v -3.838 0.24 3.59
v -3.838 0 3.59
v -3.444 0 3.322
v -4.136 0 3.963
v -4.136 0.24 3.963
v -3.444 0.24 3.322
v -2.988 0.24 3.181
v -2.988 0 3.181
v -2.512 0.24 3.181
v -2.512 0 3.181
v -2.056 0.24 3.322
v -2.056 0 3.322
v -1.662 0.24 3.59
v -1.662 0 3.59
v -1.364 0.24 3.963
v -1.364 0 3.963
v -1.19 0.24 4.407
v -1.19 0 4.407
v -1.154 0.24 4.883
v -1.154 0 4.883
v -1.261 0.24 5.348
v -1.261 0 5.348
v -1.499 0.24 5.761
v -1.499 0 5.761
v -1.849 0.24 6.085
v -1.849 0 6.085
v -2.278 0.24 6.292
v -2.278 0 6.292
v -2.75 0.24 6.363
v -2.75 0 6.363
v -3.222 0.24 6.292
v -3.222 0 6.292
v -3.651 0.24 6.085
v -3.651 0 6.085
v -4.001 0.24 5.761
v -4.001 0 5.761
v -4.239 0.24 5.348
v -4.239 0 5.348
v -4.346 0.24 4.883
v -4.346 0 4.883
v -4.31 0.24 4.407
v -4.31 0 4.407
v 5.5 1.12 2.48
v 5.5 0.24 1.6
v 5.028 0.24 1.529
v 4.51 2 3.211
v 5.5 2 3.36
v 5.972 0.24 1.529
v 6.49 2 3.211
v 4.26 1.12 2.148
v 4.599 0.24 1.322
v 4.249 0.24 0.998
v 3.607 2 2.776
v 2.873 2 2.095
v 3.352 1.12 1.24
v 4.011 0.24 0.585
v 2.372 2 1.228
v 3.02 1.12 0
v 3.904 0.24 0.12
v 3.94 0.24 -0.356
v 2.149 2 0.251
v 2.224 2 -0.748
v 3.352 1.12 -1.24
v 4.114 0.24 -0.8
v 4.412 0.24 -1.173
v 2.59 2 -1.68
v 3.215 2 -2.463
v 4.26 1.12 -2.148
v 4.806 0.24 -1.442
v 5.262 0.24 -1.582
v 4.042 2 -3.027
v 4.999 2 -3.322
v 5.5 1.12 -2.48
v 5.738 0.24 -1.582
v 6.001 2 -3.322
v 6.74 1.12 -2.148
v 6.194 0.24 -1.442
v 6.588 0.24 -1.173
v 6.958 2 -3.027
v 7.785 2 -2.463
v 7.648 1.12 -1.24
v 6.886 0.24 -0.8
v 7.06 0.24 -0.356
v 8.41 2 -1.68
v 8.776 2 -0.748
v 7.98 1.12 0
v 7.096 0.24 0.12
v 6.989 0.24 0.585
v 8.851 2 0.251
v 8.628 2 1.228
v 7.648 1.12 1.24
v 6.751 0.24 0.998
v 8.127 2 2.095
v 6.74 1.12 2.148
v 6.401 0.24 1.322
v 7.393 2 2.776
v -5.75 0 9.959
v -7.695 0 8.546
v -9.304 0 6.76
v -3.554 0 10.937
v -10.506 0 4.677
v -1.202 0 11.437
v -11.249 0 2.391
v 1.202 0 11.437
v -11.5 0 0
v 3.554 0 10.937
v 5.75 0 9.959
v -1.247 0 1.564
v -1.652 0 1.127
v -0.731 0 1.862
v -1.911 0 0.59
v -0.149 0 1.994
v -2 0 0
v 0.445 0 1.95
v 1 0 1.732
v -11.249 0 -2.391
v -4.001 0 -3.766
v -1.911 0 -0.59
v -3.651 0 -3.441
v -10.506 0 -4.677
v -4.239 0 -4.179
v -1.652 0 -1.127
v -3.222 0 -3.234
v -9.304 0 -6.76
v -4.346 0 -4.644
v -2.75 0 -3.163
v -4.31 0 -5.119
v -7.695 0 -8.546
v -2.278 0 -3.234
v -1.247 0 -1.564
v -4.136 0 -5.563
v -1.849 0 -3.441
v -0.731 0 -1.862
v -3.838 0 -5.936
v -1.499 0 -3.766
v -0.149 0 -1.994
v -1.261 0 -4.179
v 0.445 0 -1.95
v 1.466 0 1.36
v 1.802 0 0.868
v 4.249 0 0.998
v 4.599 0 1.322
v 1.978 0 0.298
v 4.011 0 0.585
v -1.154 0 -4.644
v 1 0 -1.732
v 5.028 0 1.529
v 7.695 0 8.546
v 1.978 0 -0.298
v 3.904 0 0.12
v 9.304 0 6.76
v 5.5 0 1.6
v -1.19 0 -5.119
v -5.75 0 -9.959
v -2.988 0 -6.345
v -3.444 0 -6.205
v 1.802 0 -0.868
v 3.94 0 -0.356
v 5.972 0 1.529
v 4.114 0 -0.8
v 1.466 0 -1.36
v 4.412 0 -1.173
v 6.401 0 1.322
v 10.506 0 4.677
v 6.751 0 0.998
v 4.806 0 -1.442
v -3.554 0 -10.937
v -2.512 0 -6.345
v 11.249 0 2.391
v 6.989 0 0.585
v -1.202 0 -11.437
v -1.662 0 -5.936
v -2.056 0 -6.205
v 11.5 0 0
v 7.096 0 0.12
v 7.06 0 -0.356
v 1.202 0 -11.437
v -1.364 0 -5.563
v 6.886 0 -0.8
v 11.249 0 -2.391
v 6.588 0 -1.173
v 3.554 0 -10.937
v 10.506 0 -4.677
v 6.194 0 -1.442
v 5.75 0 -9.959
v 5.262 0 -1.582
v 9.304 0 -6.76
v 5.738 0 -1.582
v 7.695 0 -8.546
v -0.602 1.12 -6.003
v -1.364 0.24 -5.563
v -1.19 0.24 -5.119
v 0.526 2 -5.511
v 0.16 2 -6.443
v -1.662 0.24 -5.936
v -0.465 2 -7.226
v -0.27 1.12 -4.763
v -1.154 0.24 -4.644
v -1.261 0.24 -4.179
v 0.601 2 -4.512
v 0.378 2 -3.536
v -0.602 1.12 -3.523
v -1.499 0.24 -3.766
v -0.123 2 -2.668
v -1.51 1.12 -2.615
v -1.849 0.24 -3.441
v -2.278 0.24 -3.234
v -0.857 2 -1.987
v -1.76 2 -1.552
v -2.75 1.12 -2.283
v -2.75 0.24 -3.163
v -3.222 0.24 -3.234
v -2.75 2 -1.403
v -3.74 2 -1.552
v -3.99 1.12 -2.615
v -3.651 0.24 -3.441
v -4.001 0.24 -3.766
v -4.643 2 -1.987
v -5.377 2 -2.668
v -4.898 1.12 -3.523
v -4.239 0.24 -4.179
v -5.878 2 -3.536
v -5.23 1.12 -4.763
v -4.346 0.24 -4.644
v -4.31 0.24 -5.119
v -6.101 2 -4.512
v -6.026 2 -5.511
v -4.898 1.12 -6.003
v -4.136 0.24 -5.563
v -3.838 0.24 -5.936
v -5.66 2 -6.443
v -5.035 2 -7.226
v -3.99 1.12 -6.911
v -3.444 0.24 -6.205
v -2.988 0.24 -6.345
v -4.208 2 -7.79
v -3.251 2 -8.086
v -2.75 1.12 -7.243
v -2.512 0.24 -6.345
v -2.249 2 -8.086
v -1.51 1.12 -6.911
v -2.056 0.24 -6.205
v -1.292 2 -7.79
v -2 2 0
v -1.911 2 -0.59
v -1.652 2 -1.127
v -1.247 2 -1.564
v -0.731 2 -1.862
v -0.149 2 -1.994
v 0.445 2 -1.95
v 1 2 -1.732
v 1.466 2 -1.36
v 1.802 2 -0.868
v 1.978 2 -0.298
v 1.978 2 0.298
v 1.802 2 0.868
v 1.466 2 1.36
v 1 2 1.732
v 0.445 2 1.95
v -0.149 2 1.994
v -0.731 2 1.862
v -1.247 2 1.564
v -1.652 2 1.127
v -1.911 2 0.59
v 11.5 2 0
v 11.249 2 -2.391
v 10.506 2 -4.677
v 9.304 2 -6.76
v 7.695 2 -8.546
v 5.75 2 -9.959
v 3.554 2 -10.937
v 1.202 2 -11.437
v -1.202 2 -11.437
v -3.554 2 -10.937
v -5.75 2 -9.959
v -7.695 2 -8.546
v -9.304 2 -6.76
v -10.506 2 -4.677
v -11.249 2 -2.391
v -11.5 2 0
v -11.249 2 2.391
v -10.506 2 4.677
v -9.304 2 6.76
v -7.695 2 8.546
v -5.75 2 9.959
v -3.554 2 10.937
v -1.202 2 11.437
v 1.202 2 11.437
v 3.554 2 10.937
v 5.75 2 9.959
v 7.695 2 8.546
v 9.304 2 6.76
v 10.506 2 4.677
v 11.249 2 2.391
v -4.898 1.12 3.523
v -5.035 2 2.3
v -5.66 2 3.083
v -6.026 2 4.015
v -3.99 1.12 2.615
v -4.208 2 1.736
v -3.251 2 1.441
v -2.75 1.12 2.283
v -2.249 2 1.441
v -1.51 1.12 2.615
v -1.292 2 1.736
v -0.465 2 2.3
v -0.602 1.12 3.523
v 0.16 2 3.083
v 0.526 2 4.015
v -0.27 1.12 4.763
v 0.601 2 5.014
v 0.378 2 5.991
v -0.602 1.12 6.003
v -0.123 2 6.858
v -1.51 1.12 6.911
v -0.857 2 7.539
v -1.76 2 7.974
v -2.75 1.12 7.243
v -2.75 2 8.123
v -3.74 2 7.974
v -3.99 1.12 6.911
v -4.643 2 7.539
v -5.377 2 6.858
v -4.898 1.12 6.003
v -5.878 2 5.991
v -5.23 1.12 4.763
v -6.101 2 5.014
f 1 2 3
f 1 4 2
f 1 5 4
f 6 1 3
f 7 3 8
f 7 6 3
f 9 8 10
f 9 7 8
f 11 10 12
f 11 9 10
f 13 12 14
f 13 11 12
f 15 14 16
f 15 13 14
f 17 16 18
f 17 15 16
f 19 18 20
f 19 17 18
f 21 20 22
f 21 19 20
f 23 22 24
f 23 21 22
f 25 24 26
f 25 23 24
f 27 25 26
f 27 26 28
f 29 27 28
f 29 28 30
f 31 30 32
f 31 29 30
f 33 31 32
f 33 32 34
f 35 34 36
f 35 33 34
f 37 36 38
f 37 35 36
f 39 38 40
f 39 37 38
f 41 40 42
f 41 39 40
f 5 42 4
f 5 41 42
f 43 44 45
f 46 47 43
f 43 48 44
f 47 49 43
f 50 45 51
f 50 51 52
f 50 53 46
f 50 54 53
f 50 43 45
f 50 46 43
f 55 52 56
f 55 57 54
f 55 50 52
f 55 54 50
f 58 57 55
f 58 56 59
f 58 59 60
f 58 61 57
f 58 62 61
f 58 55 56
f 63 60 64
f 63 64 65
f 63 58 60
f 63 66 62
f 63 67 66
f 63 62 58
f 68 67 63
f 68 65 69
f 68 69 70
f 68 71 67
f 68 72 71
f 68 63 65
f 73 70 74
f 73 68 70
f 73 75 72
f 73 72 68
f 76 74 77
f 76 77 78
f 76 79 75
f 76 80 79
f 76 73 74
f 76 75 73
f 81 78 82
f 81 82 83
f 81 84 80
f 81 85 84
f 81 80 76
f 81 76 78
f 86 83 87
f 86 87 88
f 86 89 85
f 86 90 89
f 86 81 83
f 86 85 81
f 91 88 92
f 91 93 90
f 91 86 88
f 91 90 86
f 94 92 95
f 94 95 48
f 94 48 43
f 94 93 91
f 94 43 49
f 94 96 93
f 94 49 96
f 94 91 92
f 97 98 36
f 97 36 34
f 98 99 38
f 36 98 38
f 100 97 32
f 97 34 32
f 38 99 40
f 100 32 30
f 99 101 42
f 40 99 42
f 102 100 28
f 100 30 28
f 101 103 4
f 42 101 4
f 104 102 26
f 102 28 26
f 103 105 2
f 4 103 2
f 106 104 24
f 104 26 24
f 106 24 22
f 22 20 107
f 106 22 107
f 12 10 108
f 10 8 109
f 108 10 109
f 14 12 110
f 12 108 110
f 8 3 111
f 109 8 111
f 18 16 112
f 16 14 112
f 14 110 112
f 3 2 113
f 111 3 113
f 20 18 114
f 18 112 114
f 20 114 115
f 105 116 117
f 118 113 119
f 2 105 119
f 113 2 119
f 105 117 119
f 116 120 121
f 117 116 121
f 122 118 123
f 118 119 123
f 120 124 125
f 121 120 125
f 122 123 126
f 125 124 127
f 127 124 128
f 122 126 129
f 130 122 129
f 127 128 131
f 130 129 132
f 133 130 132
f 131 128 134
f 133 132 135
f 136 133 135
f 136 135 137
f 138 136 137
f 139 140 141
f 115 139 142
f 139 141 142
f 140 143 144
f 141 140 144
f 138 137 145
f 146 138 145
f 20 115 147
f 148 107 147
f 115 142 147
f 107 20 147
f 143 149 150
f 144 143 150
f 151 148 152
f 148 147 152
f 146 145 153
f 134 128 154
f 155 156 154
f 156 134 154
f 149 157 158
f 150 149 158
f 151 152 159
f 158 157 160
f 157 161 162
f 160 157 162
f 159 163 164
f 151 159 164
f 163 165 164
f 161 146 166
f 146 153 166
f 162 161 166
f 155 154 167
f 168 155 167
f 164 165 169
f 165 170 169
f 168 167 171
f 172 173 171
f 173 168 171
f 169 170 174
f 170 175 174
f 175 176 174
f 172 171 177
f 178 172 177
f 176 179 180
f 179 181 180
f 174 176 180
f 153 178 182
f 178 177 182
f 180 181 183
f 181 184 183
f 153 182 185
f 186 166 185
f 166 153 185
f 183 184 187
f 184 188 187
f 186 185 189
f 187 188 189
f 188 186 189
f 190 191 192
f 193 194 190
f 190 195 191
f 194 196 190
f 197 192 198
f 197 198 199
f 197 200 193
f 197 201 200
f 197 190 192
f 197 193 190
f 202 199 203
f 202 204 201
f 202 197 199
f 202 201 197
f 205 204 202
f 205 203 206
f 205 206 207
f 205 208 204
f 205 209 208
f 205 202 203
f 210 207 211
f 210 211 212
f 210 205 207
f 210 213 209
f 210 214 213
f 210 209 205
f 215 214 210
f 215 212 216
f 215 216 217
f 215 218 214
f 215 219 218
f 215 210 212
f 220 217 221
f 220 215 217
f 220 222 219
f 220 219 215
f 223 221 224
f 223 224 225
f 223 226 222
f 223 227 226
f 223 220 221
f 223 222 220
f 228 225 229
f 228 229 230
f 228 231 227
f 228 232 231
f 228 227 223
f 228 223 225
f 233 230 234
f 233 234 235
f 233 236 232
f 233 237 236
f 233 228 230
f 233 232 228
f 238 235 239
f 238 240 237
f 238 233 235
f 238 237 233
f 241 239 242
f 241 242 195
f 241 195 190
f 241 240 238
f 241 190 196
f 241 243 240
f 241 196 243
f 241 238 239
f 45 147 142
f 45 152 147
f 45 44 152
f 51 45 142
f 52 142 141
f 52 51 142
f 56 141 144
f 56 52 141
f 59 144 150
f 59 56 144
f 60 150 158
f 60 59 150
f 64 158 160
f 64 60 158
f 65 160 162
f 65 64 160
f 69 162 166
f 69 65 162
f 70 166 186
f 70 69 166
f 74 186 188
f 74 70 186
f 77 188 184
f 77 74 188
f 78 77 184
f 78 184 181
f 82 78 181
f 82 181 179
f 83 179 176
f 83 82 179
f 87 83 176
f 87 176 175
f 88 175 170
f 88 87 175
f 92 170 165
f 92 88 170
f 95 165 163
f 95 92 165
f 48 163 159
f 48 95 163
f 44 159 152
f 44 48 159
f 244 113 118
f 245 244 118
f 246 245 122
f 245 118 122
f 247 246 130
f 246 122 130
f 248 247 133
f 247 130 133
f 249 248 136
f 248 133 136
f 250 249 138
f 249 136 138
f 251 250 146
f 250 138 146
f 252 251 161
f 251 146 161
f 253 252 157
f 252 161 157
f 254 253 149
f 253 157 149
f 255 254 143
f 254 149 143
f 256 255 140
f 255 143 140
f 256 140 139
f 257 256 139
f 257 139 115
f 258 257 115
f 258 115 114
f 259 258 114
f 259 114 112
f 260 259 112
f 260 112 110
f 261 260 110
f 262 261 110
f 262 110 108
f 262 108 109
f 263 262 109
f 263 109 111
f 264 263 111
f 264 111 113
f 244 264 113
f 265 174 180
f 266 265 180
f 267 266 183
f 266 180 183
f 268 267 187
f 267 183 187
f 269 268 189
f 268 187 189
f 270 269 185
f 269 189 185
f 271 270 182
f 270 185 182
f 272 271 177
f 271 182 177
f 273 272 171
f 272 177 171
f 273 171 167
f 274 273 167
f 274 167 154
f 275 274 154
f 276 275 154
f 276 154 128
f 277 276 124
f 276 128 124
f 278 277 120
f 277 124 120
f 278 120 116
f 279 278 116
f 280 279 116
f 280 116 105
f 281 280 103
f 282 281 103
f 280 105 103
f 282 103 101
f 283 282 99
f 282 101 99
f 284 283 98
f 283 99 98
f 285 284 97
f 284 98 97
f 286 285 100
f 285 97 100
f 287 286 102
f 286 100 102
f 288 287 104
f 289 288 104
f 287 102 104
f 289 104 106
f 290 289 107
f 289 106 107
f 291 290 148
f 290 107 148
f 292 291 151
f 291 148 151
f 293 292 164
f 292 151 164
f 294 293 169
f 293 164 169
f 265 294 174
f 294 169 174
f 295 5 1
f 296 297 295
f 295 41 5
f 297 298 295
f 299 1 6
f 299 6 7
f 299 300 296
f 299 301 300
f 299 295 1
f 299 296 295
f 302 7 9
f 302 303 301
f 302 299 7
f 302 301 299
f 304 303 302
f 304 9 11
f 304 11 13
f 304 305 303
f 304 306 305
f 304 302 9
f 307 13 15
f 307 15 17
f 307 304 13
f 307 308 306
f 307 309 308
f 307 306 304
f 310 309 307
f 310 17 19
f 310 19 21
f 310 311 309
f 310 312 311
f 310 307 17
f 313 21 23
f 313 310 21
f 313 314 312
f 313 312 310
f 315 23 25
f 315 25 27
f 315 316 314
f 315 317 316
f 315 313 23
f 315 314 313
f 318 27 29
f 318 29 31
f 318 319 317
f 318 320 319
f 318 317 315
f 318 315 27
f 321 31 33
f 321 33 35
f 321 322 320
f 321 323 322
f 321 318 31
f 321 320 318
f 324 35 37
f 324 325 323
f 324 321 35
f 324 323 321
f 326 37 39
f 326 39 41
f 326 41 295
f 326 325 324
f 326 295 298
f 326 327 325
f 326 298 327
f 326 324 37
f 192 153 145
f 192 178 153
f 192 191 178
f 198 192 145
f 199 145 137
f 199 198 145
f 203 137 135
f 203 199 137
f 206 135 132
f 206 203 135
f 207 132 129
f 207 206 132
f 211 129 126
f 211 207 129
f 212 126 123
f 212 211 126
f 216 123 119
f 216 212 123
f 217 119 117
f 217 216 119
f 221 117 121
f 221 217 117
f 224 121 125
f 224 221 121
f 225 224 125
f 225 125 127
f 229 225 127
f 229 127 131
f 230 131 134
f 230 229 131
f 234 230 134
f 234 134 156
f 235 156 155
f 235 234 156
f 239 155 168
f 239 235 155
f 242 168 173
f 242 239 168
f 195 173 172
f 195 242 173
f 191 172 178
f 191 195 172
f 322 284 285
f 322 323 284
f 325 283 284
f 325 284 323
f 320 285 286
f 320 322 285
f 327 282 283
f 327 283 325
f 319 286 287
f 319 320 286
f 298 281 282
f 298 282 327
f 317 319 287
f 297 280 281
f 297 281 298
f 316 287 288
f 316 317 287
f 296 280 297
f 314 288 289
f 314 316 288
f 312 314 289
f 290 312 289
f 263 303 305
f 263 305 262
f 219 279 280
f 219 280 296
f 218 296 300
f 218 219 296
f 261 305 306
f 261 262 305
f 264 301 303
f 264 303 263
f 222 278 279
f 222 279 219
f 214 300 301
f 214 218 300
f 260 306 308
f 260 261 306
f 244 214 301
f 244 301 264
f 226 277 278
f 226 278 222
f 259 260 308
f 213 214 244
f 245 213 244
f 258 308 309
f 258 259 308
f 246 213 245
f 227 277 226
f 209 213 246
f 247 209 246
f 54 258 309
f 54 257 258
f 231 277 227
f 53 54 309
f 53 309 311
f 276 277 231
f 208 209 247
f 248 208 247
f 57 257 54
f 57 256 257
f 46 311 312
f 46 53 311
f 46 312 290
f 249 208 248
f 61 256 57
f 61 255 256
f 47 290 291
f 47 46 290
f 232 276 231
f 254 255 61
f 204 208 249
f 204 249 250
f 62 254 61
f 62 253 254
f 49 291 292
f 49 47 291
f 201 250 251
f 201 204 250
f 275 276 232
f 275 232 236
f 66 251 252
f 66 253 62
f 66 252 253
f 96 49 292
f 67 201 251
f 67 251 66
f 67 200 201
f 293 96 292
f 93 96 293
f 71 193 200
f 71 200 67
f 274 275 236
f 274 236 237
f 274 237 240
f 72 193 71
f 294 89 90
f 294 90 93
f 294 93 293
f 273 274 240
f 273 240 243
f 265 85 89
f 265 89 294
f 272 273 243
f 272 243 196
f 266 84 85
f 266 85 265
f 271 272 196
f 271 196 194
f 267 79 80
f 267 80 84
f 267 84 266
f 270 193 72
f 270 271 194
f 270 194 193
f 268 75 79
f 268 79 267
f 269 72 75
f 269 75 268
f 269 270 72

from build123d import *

# Parameters (mm, degrees)
SKIZZE1_R                          = 11.5
AUFSATZ_LINEAR_AUSTRAGEN1_DEPTH    = 2
KREISMUSTER1_COUNT                 = 3
F_4_0_4_DURCHMESSER_BOHRUNG1_D     = 4
F_4_0_4_DURCHMESSER_BOHRUNG1_DEPTH = 2


with BuildPart() as part:
    # Skizze1 → Aufsatz-Linear austragen1 (new body)
    with BuildSketch(Plane(origin=(0, 0, 0), x_dir=(1, 0, 0), z_dir=(0, 1, 0))):
        Circle(SKIZZE1_R)
    extrude(amount=AUFSATZ_LINEAR_AUSTRAGEN1_DEPTH)

    # Skizze2 → Formsenkung für M3 Senkschraube mit Innensechskant1 (revolve, cut)
    with BuildSketch(Plane(origin=(5.5, 2, 0), x_dir=(0, 0, 1), z_dir=(1, 0, 0))):
        Polygon((0, 0), (0, 2.001), (1.6, 2.001), (1.6, 1.76), (3.36, 0), align=None)
    formsenkung_f_r_m3_senkschraube_mit_inne = revolve(axis=Axis((5.5, 8.35, 0), (0, -1, 0)), mode=Mode.SUBTRACT)

    # Kreismuster1: Formsenkung für M3 Senkschraube mit Innensechskant1 ×3 about axis
    kreismuster1_axis = Axis((0, 0, 0), (0, 1, 0))
    for i in range(1, KREISMUSTER1_COUNT):
        add(formsenkung_f_r_m3_senkschraube_mit_inne.rotate(kreismuster1_axis, i * 360 / KREISMUSTER1_COUNT), mode=Mode.SUBTRACT)

    # Ø4.0 (4) Durchmesser Bohrung1
    with Locations(Plane(origin=(0, 2, 0), x_dir=(1, 0, 0), z_dir=(0, 1, 0))):
        with Locations((0, 0)):
            Hole(F_4_0_4_DURCHMESSER_BOHRUNG1_D / 2, depth=F_4_0_4_DURCHMESSER_BOHRUNG1_DEPTH)


solid = part.part
